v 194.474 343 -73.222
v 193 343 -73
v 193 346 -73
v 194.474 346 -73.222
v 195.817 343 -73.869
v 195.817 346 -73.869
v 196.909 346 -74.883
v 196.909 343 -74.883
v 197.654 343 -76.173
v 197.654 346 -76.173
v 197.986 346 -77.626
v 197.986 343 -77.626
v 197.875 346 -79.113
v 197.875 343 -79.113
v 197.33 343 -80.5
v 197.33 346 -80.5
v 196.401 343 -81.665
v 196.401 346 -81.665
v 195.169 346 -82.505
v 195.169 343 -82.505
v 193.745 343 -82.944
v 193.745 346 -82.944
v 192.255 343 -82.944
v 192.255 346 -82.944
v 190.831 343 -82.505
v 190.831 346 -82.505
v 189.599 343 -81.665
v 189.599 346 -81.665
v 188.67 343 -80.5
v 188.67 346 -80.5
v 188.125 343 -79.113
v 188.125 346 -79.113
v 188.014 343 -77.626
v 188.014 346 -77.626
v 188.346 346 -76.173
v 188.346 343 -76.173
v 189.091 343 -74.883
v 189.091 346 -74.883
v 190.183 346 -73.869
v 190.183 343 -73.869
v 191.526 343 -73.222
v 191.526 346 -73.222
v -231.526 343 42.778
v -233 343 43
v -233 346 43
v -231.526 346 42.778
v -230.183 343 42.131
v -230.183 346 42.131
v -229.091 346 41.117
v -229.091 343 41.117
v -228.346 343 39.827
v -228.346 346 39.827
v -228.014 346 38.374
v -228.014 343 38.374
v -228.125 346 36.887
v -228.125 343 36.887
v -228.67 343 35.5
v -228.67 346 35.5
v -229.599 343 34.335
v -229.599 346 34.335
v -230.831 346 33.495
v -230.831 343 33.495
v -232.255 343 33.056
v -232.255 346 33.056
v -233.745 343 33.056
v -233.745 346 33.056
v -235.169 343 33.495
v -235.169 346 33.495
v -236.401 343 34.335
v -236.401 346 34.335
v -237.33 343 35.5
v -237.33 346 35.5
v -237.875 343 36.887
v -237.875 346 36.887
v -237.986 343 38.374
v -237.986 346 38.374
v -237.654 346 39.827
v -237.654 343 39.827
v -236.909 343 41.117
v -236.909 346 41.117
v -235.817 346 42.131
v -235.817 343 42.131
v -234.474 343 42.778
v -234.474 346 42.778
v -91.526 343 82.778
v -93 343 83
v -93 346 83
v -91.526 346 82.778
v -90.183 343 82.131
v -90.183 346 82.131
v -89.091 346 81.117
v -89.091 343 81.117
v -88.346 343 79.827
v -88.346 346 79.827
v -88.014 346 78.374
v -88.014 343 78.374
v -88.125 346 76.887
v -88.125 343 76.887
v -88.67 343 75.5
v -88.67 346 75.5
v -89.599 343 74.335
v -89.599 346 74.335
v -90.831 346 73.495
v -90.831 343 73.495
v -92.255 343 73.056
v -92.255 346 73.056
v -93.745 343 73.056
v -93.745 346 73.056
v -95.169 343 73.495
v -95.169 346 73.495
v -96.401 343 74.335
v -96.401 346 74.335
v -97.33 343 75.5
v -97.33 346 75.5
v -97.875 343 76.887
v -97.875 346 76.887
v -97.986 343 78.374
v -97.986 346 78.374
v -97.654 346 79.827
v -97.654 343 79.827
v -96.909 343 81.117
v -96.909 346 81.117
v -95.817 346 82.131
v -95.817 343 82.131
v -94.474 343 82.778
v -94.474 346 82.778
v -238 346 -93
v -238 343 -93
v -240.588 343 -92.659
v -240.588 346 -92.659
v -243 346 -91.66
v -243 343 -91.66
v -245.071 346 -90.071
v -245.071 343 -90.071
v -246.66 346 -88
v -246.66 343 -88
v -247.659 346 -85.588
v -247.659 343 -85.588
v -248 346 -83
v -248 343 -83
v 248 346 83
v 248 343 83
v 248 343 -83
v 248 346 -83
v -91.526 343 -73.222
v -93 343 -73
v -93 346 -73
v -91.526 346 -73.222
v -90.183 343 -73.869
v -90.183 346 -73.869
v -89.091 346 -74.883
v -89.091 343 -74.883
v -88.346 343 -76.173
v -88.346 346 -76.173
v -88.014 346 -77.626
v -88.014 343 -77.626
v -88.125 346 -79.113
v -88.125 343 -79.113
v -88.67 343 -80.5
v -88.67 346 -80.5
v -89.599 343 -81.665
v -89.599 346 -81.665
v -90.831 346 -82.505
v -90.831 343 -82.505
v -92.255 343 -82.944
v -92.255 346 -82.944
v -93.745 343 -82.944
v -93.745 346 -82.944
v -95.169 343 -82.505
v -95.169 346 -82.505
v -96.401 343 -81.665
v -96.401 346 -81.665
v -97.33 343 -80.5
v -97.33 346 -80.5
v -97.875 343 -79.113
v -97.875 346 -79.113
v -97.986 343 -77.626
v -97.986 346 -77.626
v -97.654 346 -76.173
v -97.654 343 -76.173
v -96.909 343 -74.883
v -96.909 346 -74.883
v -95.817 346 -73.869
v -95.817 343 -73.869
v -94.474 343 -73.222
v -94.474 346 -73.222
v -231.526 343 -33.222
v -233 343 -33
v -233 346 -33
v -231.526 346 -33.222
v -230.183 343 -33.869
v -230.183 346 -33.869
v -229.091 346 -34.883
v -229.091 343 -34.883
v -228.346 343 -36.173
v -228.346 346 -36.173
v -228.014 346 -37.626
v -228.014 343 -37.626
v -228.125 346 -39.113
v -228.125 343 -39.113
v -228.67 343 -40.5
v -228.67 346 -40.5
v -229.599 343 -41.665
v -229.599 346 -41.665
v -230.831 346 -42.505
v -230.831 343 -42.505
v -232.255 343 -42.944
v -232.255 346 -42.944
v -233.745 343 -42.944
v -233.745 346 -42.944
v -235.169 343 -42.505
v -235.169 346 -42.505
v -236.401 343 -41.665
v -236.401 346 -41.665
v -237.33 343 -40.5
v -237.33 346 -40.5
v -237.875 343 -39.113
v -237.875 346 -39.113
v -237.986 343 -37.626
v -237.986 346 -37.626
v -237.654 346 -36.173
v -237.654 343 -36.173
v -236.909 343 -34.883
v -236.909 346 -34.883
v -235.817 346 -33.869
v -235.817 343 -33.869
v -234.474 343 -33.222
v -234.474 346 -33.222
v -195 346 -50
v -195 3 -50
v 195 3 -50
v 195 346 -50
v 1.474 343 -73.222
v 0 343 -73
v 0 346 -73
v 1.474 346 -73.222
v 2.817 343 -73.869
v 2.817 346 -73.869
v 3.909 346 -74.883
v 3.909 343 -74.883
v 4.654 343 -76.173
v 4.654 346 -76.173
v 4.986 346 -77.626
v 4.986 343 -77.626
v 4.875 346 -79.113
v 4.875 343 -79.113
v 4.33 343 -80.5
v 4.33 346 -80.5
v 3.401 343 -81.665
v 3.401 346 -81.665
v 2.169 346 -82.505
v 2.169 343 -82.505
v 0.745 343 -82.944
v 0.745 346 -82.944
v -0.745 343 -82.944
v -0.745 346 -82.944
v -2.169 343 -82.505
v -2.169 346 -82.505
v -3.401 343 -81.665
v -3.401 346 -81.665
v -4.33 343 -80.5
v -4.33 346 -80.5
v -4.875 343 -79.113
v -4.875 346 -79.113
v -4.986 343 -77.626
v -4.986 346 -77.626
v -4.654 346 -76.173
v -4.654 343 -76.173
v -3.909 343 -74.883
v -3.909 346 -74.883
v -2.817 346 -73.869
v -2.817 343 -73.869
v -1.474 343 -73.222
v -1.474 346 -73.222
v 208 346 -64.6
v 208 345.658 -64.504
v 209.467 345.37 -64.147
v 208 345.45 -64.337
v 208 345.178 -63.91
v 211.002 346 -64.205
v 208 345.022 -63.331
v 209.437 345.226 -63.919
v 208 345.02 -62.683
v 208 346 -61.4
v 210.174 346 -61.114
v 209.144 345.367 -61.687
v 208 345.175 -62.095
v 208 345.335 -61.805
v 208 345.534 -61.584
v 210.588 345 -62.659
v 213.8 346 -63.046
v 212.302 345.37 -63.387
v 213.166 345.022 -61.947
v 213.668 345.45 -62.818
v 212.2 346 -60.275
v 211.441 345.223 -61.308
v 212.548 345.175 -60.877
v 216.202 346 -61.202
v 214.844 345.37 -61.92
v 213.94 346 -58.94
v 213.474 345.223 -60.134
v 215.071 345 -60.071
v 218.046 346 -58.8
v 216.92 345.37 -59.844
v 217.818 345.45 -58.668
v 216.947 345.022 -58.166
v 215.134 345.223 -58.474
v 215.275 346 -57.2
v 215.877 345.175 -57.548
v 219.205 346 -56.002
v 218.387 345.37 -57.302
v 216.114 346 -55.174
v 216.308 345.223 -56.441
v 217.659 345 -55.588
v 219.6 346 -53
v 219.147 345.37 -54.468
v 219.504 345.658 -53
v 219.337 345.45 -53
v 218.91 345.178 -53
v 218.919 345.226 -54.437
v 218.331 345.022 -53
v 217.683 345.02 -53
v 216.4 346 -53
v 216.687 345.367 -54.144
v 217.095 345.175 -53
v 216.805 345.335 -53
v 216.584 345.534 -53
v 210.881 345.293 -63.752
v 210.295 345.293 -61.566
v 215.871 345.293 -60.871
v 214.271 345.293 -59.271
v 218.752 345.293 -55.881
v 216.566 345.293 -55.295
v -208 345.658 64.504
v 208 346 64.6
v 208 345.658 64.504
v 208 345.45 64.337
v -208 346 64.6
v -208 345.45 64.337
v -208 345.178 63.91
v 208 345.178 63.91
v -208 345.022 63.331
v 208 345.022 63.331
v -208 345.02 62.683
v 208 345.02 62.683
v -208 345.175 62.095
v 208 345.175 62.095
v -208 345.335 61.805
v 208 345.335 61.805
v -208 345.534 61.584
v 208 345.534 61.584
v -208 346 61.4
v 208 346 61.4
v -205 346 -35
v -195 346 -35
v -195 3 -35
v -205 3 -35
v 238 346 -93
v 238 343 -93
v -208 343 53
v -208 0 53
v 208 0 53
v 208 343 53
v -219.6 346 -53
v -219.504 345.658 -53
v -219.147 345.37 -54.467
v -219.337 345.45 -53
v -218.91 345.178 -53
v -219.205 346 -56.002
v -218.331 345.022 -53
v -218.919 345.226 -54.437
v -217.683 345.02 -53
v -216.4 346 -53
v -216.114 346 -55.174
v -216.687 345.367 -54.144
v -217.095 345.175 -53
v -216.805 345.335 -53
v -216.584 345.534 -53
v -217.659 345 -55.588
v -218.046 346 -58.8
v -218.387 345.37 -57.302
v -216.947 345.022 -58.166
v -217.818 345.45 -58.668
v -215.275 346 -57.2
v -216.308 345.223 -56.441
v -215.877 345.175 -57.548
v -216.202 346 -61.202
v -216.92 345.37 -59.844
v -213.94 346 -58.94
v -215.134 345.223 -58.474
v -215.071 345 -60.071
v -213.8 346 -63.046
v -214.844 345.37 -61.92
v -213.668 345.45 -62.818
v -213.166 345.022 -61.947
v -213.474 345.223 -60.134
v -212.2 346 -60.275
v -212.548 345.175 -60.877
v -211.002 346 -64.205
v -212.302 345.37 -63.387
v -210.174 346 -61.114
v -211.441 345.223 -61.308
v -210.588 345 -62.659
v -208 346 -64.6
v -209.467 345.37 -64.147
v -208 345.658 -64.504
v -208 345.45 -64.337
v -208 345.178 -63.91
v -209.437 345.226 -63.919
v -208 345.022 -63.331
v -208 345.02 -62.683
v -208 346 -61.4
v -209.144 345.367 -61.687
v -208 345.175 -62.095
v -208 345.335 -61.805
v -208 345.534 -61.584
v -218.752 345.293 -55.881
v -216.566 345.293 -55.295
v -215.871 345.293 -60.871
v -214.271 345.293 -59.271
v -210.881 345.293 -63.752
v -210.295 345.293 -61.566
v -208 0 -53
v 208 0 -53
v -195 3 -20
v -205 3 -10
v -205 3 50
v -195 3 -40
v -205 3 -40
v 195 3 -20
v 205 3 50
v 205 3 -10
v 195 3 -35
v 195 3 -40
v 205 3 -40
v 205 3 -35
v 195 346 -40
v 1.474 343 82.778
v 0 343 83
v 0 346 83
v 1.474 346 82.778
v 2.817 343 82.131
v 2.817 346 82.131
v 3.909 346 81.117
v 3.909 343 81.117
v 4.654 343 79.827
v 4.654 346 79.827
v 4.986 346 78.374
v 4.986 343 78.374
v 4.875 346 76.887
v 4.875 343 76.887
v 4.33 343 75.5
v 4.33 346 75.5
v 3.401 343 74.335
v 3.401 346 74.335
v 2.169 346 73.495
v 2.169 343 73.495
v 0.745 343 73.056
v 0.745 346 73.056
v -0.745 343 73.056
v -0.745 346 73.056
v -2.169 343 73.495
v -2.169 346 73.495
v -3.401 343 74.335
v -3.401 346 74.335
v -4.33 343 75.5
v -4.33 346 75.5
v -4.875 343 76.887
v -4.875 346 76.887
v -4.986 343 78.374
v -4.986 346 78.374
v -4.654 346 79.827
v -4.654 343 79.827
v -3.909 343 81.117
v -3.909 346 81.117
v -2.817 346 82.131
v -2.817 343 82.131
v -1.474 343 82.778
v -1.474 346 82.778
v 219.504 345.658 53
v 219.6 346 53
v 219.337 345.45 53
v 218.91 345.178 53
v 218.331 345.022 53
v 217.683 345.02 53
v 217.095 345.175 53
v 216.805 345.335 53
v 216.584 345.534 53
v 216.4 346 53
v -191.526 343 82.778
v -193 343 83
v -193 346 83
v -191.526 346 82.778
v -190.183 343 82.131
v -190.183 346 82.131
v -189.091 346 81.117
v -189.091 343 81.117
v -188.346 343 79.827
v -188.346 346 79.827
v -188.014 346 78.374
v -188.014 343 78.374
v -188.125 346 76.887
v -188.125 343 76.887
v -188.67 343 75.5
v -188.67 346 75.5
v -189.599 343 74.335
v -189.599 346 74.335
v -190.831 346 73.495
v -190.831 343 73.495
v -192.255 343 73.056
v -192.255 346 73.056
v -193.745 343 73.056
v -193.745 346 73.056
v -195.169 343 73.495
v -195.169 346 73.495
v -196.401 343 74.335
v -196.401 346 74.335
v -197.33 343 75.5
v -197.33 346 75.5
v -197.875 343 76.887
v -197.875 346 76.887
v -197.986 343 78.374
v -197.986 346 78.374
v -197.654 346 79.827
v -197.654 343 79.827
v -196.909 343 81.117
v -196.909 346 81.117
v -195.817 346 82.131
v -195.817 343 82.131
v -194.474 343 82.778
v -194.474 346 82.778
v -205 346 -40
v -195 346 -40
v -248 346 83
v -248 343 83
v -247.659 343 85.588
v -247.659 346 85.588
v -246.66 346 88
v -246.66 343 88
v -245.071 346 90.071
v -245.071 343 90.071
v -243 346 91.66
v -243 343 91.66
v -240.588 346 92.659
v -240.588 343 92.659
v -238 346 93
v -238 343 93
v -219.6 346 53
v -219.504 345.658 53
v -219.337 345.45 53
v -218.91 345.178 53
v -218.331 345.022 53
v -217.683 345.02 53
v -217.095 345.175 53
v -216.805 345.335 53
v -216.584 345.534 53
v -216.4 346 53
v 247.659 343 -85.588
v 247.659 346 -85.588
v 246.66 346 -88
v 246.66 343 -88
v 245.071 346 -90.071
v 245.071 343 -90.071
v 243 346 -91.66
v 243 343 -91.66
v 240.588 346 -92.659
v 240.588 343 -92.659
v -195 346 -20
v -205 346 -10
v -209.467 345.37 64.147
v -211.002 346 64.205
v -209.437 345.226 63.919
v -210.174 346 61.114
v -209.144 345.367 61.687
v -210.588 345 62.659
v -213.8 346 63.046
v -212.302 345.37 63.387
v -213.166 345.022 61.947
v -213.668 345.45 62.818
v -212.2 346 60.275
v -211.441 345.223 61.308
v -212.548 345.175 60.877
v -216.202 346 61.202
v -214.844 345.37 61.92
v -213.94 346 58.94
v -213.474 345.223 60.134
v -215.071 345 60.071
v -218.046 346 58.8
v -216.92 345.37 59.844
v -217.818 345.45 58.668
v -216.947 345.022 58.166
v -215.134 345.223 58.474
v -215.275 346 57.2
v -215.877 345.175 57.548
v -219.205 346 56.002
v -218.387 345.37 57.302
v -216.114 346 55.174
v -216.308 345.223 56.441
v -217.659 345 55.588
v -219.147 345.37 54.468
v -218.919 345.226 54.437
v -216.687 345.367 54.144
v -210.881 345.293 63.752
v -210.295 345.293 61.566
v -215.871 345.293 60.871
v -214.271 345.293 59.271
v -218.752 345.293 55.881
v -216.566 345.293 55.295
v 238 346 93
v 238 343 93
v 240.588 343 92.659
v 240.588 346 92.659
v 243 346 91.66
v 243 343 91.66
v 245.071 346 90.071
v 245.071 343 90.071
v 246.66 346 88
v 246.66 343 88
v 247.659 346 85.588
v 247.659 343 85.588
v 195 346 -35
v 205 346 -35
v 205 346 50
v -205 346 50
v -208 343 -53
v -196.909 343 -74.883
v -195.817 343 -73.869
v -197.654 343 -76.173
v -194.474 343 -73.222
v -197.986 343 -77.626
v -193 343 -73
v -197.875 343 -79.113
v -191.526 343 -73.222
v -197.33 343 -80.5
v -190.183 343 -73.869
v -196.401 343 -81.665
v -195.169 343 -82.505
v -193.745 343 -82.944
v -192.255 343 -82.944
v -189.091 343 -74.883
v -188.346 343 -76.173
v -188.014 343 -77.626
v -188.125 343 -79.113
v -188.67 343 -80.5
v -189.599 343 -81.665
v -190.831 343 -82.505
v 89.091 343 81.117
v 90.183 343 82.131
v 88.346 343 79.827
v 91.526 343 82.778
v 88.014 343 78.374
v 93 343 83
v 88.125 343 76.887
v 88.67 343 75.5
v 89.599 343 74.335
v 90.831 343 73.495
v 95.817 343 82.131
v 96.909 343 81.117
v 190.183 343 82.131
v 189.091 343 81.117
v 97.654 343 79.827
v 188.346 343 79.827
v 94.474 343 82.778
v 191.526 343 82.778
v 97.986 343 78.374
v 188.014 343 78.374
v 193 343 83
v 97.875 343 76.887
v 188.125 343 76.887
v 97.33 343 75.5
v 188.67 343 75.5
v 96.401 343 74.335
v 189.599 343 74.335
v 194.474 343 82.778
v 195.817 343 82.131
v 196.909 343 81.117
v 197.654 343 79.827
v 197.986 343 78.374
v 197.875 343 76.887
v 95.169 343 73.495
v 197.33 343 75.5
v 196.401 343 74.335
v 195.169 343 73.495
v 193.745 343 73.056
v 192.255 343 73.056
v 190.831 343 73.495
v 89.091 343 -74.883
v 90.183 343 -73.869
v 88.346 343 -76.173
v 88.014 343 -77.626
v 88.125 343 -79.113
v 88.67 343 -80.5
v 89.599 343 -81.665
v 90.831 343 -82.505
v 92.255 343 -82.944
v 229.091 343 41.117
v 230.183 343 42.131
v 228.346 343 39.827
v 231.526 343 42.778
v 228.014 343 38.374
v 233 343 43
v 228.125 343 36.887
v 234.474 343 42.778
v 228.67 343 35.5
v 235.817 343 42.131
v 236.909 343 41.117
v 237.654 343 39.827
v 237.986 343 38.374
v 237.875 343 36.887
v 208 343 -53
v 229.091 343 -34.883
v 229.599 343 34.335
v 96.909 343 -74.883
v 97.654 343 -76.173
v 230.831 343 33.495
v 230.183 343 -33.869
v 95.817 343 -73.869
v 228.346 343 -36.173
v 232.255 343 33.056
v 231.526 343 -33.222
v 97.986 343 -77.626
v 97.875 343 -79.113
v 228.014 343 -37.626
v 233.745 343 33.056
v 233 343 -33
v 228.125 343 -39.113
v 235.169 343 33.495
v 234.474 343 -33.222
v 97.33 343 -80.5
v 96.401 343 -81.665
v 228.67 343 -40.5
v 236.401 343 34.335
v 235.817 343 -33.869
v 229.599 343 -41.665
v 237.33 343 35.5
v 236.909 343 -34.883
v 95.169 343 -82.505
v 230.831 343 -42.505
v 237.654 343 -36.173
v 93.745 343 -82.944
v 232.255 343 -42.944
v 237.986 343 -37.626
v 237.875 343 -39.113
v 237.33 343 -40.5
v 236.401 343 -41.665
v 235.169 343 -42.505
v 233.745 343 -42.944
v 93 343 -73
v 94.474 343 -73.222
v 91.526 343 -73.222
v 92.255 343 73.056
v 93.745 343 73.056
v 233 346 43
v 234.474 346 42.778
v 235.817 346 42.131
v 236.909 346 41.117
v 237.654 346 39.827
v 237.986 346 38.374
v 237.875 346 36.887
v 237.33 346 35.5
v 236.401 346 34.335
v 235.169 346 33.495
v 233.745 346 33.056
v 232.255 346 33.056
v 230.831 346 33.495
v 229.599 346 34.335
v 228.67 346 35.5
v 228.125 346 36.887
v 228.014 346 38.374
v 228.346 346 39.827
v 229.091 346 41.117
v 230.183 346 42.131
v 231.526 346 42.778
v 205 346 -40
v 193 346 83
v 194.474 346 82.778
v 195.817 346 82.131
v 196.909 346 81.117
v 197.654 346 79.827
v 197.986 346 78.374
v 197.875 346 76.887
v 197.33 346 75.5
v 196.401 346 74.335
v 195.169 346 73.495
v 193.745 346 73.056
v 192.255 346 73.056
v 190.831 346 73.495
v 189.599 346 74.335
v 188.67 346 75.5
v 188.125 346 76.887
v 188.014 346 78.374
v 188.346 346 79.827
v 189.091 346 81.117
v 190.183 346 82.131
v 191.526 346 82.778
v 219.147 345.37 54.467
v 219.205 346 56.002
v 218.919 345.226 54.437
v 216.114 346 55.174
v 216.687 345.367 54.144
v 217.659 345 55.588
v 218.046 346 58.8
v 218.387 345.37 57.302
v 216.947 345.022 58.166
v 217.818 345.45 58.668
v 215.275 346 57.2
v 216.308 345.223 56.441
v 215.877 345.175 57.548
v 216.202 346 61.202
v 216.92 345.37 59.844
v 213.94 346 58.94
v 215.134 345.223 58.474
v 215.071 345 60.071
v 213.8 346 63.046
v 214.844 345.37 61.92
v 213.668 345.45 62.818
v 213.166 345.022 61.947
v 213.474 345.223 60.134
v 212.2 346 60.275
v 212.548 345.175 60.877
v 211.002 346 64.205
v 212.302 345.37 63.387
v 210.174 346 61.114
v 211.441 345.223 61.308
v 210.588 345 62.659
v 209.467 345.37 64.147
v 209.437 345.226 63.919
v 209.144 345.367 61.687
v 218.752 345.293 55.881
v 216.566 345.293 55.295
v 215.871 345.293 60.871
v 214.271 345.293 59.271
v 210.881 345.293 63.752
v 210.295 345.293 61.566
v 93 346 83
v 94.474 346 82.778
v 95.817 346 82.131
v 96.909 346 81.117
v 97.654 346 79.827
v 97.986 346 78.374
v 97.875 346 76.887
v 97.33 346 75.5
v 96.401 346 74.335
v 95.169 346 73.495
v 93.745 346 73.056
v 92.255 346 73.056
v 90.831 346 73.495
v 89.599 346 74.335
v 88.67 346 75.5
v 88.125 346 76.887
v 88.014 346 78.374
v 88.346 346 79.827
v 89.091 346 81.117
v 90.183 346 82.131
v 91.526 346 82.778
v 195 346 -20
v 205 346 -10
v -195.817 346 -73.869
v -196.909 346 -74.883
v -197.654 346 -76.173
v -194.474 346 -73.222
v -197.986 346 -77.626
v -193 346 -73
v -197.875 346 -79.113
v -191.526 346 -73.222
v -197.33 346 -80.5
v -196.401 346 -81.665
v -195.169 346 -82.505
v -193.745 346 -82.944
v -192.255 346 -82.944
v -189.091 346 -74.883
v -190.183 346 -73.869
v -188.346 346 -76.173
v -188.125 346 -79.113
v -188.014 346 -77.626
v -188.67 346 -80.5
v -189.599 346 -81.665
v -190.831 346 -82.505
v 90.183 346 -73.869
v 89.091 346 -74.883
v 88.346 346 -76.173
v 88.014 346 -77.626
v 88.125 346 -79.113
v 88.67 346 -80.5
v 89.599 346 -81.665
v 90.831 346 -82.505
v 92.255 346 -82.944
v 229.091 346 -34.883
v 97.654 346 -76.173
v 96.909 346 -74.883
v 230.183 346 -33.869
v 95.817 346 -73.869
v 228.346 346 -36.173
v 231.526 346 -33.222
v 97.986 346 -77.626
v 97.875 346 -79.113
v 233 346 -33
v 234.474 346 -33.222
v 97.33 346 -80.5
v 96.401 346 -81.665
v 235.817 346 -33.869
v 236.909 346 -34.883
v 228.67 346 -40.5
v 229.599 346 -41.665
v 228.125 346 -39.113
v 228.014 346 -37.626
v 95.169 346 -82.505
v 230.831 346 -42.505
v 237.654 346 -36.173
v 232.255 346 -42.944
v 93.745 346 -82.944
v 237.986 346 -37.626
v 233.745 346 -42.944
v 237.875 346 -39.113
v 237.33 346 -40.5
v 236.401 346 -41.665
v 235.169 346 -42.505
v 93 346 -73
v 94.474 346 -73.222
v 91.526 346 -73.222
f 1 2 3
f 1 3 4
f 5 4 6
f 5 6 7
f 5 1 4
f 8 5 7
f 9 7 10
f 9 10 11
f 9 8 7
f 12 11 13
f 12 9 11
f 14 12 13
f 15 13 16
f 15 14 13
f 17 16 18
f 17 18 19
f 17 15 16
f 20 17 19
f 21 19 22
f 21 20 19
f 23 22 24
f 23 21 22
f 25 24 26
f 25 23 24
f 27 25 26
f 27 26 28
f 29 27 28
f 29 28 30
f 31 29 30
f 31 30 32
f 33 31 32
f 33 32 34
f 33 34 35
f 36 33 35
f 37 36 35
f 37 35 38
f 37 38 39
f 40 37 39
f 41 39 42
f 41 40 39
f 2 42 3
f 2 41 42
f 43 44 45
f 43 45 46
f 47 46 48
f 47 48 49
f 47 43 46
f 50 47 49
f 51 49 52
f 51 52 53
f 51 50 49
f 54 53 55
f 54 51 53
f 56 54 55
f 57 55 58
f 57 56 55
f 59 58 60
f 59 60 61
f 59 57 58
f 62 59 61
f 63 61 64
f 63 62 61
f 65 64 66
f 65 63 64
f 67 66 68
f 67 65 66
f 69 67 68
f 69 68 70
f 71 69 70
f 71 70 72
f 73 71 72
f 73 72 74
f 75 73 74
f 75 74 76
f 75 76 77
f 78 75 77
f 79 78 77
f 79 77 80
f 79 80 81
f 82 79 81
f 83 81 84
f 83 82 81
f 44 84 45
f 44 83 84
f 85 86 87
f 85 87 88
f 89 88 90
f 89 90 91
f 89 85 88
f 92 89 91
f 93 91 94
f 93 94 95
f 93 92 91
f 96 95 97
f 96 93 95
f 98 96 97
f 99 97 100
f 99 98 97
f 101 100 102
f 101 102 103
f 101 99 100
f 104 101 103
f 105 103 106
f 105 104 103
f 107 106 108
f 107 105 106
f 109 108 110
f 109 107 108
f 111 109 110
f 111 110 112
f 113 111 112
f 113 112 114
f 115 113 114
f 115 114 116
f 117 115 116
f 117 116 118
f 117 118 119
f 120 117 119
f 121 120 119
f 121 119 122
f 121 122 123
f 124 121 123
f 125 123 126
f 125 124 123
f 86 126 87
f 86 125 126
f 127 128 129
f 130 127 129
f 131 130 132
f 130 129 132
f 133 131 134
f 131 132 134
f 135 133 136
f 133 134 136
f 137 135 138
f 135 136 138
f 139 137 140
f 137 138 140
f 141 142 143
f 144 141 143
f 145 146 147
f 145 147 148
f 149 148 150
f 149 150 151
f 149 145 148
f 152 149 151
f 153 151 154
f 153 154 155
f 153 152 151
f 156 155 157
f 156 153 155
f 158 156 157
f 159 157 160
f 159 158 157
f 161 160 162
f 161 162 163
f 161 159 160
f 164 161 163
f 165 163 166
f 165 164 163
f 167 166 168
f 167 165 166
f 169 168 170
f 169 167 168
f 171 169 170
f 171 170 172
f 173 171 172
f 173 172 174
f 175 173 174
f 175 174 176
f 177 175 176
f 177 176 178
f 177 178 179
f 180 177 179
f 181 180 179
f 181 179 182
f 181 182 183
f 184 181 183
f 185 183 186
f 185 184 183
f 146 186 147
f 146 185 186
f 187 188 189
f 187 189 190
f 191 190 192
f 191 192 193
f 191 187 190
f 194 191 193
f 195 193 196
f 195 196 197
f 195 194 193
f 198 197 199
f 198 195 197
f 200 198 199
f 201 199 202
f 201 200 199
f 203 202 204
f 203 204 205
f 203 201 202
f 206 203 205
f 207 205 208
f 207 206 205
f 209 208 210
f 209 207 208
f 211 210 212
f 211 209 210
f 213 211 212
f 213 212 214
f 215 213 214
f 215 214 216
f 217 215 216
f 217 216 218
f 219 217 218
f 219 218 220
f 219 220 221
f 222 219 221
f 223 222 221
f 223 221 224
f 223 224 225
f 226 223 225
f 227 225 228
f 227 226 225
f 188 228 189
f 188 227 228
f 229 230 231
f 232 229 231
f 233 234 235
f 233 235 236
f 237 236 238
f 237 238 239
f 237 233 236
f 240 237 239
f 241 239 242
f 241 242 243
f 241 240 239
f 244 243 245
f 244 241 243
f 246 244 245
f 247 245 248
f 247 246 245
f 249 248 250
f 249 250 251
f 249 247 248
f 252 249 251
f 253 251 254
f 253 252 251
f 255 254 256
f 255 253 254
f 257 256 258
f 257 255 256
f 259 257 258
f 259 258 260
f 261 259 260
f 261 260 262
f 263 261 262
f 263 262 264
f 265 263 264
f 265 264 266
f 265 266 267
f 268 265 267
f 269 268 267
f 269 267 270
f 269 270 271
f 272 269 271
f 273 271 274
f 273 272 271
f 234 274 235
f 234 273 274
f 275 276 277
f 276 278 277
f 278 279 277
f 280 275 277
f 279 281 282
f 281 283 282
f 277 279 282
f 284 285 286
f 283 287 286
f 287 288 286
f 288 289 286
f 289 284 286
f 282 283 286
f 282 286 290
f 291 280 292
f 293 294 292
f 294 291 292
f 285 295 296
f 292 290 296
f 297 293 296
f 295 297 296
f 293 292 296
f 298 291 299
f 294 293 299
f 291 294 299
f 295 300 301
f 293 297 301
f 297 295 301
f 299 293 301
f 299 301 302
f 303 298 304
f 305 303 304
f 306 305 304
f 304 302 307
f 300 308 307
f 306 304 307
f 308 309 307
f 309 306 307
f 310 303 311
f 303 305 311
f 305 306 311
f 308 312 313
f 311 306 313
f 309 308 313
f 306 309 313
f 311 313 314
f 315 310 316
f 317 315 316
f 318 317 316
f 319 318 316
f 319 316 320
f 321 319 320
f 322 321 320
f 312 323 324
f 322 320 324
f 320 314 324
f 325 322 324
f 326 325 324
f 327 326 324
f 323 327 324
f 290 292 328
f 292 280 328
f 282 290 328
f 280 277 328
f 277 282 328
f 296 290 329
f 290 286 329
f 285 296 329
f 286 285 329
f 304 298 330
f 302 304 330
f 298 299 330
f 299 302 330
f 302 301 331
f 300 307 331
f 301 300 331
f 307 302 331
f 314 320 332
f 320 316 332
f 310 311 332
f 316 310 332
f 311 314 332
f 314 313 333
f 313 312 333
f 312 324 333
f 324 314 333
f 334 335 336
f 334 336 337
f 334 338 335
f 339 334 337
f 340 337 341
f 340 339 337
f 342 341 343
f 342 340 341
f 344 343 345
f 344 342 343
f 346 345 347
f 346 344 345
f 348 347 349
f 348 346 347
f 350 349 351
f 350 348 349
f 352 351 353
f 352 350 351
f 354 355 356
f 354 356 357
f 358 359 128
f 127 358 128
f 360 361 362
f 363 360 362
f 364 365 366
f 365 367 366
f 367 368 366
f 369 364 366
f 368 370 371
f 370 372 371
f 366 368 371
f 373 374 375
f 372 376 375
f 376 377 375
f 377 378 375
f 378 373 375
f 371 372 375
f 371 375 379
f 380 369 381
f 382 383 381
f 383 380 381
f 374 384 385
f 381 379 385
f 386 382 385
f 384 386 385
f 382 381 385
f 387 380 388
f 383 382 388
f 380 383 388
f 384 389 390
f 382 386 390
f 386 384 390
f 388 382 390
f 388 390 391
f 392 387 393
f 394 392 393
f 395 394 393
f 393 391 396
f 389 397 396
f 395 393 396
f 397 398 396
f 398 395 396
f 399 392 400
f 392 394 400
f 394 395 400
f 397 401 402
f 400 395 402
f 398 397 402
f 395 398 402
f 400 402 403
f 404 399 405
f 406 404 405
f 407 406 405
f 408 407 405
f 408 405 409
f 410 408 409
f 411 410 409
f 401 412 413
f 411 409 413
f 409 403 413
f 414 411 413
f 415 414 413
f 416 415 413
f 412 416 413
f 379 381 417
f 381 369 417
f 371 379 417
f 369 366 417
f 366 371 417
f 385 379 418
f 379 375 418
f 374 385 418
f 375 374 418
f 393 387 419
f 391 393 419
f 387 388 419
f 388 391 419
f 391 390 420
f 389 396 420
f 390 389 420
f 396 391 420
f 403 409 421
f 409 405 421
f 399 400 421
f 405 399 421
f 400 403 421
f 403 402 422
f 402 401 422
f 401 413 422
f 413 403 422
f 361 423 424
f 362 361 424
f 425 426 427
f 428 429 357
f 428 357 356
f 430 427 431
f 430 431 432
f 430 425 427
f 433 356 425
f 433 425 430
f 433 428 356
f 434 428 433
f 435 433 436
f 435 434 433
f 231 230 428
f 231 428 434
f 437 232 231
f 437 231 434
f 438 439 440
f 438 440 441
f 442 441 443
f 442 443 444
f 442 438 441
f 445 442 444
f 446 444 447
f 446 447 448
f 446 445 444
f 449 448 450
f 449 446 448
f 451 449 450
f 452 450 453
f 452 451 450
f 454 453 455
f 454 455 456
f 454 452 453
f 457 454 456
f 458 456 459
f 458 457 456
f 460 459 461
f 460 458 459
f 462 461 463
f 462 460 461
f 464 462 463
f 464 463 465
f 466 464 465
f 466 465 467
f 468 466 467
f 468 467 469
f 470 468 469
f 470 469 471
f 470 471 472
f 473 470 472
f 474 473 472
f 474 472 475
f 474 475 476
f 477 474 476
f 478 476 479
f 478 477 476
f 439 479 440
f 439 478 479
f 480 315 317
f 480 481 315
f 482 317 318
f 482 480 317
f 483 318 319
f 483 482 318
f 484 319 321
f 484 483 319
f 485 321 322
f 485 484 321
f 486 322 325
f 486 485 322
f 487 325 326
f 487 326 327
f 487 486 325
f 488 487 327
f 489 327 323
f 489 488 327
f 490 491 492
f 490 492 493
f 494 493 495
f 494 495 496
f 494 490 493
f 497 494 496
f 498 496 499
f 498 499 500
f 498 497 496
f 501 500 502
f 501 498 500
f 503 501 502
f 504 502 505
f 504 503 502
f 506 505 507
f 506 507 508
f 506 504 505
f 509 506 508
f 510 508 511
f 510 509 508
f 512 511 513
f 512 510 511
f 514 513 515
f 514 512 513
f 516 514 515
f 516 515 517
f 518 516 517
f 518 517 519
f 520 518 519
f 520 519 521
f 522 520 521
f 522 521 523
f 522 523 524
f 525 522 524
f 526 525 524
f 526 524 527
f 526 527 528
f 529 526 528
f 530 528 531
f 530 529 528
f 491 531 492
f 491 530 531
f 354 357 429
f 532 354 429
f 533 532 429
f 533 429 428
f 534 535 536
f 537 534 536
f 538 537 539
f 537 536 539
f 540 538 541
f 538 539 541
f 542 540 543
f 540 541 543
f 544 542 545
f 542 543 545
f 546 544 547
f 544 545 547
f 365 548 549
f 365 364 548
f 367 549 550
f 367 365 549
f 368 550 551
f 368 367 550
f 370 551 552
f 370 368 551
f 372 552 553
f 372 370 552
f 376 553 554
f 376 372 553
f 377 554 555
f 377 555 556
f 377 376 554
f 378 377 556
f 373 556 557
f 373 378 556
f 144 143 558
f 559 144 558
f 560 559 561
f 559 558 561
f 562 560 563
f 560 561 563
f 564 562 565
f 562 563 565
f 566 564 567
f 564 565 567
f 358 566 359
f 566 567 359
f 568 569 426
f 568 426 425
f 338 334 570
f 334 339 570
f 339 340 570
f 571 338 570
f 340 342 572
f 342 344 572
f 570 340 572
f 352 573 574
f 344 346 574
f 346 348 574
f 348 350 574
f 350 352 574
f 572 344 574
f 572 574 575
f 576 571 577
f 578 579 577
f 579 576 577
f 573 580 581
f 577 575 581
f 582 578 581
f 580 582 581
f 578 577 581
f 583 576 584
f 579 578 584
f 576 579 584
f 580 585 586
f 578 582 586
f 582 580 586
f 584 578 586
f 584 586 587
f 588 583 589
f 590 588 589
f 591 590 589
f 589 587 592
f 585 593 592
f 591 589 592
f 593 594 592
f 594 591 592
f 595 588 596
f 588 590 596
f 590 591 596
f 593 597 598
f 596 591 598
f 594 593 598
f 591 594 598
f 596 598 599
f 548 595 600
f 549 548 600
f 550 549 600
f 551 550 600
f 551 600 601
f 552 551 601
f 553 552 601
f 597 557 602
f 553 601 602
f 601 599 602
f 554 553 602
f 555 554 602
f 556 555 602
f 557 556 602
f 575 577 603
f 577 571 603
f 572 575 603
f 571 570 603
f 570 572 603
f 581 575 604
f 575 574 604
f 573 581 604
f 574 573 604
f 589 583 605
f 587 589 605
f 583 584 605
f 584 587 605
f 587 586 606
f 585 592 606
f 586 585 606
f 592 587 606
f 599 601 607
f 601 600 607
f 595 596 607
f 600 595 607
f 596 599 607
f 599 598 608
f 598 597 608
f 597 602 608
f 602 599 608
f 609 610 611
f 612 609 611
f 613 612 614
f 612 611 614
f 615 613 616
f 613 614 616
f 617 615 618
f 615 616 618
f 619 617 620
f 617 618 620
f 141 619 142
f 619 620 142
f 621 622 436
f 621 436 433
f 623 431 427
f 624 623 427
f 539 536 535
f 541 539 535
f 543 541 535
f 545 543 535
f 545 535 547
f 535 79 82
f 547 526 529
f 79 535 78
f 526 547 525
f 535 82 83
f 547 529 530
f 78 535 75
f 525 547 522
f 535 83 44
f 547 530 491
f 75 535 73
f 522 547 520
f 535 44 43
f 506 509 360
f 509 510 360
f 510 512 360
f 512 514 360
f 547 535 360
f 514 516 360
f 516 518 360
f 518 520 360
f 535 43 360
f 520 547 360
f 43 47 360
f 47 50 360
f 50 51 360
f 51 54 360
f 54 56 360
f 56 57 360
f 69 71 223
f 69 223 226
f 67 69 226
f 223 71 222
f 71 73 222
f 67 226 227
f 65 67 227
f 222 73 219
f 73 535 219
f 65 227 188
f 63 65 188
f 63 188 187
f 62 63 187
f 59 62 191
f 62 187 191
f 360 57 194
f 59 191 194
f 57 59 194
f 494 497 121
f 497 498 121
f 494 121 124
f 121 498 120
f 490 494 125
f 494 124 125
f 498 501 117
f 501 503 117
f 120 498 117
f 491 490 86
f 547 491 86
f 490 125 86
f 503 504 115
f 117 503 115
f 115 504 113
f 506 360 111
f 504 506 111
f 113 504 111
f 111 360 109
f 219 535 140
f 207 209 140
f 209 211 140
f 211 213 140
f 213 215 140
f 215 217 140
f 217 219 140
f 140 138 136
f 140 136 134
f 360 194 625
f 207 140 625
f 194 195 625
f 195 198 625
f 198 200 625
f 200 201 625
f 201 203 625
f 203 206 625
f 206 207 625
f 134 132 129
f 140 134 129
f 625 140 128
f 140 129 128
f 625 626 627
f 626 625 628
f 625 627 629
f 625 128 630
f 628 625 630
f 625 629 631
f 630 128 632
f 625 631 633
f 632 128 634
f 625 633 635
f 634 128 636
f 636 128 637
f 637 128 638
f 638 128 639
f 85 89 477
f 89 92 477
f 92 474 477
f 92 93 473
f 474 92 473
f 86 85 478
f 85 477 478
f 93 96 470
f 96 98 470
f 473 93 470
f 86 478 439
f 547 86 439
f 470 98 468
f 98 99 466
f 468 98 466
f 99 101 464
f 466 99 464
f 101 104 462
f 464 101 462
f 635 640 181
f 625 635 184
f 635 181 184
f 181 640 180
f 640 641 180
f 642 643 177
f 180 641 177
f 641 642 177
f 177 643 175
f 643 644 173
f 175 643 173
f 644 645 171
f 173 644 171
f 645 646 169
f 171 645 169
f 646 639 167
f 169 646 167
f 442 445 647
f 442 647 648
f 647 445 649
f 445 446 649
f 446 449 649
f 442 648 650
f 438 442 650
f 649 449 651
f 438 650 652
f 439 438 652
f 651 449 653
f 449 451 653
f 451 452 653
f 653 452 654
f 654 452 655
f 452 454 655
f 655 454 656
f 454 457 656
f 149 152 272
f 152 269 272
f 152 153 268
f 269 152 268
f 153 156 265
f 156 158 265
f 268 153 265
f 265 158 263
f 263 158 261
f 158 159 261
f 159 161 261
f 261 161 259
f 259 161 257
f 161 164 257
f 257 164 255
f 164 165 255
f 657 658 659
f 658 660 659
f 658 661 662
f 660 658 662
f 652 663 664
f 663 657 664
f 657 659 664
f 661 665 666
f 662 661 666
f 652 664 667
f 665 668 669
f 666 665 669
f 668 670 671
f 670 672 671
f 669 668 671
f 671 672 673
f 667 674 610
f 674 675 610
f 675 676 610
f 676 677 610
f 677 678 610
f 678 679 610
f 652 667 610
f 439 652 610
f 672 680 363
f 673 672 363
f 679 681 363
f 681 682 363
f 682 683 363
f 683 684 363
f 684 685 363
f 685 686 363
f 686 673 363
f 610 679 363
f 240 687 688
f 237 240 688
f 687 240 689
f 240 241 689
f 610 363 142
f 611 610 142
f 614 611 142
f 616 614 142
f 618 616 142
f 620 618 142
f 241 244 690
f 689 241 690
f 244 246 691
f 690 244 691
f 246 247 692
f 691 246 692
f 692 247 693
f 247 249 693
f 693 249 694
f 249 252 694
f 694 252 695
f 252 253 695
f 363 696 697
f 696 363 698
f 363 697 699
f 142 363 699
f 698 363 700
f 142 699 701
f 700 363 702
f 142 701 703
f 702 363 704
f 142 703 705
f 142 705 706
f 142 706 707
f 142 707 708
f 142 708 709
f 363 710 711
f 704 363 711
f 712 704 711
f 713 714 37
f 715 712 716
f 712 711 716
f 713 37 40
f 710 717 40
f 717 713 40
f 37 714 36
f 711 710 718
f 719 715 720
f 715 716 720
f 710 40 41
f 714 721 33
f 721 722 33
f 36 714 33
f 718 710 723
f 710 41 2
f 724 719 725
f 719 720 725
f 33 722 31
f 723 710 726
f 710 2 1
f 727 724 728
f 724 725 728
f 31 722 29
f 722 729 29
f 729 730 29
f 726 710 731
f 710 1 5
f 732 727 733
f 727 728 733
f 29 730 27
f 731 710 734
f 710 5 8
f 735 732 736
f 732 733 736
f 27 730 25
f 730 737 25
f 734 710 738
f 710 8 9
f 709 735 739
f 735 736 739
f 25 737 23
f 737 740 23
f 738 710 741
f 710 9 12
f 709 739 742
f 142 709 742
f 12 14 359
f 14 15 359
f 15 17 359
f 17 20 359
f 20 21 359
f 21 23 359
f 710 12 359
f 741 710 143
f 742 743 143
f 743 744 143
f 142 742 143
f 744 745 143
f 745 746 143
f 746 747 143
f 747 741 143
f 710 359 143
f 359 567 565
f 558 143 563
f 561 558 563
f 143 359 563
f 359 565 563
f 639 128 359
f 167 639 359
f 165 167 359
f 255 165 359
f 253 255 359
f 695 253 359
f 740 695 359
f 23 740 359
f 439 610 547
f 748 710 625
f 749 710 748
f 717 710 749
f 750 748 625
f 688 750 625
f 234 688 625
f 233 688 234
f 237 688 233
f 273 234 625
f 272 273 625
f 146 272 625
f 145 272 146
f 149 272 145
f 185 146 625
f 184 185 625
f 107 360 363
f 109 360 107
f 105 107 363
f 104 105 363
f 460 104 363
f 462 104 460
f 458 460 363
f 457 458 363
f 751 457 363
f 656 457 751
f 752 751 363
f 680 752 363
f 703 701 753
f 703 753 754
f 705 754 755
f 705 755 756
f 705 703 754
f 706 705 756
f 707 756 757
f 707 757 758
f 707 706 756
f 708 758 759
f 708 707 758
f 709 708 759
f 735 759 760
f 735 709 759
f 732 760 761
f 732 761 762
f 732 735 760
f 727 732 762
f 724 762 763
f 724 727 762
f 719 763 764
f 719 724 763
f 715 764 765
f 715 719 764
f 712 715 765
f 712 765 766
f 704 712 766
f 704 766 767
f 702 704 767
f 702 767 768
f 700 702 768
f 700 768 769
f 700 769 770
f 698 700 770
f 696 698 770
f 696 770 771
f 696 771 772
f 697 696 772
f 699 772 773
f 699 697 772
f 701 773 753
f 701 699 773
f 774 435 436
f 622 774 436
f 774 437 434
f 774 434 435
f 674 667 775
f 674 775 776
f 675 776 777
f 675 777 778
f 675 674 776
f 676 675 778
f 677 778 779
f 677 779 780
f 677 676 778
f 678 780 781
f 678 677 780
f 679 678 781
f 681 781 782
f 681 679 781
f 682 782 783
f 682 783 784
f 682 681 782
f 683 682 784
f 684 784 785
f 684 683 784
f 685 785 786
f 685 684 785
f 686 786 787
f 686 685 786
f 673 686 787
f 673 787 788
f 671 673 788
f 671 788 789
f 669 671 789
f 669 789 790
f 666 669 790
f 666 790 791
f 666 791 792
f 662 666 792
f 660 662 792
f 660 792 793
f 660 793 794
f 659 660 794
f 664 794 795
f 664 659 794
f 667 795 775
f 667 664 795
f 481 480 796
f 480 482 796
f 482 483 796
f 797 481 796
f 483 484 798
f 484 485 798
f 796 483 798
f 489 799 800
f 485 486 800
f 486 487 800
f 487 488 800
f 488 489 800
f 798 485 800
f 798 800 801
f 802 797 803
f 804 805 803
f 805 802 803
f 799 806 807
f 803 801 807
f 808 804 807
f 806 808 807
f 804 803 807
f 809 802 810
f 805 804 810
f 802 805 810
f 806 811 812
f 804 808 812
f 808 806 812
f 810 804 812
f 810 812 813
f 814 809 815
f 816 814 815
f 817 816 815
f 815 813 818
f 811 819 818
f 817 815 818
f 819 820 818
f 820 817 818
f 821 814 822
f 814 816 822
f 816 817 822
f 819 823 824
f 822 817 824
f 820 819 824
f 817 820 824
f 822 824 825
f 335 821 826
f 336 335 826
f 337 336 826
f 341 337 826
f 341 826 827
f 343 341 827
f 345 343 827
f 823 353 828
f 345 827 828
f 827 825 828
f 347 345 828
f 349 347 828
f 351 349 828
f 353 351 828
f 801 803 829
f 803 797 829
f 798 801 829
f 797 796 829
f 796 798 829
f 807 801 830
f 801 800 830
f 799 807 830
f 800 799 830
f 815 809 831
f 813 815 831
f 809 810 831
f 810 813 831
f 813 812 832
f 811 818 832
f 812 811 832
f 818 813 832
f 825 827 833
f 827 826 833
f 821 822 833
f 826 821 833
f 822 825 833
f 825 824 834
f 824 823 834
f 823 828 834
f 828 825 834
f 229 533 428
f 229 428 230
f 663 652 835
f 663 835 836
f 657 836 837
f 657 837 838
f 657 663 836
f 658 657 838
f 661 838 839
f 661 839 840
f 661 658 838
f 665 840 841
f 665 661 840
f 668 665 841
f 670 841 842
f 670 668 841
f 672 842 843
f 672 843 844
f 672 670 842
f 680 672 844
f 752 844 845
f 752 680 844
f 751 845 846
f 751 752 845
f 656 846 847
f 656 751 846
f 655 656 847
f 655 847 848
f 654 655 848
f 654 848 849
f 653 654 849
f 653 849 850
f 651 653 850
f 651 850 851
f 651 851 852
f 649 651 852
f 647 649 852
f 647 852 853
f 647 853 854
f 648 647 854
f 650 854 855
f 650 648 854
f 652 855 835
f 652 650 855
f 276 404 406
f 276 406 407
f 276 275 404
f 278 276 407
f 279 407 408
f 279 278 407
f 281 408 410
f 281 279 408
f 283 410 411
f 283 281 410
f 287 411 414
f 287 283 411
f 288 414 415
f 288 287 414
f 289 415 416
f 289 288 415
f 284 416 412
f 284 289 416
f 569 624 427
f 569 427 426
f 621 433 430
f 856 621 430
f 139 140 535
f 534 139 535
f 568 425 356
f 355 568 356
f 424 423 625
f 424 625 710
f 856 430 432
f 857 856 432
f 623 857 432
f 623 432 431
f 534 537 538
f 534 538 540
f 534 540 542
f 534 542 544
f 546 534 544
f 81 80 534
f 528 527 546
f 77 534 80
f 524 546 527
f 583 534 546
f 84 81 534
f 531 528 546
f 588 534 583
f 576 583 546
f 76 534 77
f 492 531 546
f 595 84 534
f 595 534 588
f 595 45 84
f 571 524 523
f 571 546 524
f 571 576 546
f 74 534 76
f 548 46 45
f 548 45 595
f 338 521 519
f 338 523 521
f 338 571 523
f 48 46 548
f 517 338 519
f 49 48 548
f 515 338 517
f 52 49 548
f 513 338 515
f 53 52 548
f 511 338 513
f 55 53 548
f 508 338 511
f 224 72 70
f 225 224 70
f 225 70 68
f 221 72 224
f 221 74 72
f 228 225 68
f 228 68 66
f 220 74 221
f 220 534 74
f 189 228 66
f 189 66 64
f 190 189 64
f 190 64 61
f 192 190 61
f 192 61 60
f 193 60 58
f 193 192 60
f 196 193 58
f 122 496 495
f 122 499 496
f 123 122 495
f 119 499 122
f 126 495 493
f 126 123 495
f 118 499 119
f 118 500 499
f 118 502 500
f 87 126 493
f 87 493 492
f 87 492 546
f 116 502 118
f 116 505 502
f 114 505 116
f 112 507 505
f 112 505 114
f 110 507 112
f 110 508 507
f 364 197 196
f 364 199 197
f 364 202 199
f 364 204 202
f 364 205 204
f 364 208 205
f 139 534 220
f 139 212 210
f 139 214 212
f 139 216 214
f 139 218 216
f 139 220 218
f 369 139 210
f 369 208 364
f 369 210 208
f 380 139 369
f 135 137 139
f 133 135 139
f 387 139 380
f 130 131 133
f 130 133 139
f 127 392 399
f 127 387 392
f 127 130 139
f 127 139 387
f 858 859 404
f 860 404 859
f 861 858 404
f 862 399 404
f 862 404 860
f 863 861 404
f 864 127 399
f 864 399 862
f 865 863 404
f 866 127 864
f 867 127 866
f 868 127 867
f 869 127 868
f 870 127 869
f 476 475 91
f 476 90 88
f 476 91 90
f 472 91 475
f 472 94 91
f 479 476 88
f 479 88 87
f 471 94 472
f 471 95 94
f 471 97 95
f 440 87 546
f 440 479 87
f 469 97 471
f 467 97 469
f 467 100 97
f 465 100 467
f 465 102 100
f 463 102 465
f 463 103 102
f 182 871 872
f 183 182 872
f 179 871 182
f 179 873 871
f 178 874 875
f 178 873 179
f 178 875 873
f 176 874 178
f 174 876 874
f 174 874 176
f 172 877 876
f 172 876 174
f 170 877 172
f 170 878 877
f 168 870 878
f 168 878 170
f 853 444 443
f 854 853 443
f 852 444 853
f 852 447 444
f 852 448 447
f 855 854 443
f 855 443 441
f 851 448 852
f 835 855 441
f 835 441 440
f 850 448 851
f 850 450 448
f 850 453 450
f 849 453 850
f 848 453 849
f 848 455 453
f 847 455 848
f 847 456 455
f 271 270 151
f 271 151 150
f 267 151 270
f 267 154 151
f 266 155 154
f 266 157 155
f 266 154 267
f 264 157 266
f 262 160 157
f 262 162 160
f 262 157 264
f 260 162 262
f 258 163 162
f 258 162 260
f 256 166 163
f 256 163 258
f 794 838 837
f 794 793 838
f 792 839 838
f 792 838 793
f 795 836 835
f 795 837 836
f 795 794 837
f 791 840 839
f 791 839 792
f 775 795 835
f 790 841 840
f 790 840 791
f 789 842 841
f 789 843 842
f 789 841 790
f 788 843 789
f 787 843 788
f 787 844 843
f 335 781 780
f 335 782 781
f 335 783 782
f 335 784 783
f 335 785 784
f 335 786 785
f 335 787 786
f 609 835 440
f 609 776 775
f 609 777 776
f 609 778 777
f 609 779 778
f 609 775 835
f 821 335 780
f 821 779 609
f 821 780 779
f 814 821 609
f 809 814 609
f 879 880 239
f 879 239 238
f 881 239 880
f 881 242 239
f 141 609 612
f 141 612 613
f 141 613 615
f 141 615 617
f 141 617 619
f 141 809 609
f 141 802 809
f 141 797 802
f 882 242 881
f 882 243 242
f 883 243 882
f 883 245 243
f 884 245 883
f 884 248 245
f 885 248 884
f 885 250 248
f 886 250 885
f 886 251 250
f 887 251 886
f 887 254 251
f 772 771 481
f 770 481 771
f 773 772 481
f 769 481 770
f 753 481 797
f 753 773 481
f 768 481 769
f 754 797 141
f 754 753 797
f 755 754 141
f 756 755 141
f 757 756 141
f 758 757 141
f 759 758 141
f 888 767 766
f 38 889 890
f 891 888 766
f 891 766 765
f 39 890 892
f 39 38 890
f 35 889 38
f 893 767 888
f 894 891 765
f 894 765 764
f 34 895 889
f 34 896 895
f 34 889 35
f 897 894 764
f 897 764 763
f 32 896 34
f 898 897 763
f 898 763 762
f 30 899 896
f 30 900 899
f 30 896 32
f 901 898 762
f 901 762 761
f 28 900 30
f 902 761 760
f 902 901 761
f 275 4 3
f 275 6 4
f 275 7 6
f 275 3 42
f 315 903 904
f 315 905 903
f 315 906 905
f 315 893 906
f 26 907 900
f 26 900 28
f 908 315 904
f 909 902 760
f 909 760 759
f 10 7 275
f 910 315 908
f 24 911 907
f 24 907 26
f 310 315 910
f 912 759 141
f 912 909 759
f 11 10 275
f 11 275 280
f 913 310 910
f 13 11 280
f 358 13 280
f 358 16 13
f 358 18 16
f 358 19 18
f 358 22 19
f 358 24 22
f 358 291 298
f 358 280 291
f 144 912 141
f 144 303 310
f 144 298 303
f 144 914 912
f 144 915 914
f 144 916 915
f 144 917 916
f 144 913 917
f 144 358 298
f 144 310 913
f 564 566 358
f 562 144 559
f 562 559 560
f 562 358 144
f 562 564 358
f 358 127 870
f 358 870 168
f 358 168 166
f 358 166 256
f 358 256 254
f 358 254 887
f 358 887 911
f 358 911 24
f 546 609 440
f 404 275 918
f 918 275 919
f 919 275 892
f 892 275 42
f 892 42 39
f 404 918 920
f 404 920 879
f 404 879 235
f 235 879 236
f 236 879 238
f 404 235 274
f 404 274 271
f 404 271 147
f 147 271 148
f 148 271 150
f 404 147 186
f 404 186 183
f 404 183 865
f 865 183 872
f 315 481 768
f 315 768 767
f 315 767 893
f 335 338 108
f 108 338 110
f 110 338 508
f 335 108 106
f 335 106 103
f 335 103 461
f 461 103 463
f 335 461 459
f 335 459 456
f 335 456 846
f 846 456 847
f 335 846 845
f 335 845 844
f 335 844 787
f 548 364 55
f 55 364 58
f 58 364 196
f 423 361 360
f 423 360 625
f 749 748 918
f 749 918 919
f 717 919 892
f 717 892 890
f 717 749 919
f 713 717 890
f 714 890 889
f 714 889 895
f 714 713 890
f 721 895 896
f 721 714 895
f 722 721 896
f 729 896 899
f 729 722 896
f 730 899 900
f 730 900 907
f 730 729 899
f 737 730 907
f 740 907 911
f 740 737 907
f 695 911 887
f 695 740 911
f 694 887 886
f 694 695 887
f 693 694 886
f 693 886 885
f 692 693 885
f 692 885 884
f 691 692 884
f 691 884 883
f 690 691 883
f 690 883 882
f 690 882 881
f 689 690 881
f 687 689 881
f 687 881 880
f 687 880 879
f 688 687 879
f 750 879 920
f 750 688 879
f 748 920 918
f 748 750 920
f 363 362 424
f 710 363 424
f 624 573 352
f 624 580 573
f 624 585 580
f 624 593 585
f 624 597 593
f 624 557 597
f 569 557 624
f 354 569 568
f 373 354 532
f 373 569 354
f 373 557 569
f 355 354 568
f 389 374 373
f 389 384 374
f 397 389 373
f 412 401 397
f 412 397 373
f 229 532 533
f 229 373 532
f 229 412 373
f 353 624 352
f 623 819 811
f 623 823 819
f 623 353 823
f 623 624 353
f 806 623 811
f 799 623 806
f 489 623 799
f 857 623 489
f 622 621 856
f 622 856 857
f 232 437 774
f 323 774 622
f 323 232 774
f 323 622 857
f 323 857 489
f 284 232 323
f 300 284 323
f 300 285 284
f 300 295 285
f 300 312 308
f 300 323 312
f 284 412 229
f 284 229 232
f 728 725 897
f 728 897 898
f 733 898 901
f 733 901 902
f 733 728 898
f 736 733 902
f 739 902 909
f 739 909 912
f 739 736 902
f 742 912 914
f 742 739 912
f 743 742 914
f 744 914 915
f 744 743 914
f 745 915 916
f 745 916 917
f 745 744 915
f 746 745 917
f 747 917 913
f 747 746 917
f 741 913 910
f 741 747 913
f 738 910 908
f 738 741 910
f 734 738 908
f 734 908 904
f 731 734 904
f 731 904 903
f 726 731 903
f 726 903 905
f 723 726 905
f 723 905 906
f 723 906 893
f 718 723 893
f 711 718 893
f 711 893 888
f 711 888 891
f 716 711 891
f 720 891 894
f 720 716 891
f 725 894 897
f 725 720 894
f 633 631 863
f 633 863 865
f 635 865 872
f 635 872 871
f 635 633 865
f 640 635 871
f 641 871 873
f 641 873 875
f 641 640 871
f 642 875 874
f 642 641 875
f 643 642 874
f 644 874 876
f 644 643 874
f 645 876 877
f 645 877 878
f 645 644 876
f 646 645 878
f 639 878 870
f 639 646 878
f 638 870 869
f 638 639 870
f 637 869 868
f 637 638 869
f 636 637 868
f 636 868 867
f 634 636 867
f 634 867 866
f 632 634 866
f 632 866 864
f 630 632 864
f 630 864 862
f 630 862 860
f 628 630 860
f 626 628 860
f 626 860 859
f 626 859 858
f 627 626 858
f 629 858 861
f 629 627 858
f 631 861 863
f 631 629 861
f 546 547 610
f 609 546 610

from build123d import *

# Parameters (mm, degrees)
BOSS_EXTRUDE1_DEPTH = 3
SKETCH1_3_W         = 416
SKETCH1_3_H         = 106
BOSS_EXTRUDE2_DEPTH = 343
SKETCH2_R           = 5
BOSS_EXTRUDE3_DEPTH = 3
SKETCH3_RX          = 1.6
SKETCH3_RY          = 1


with BuildPart() as part:
    # Sketch1 → Boss-Extrude1 (new body)
    with BuildSketch(Plane(origin=(0, 0, 0), x_dir=(1, 0, 0), z_dir=(0, 1, 0))):
        Polygon((-195, 40), (-205, 40), (-205, 35), (-195, 35), (-195, 20), (-205, 10), (-205, -50), (205, -50), (205, 10), (195, 20), (195, 35), (205, 35), (205, 40), (195, 40), (195, 50), (-195, 50), align=None)
    extrude(amount=BOSS_EXTRUDE1_DEPTH)

    # Sketch1<3> → Boss-Extrude2 (add)
    with BuildSketch(Plane(origin=(0, 0, 0), x_dir=(1, 0, 0), z_dir=(0, 1, 0))):
        Rectangle(SKETCH1_3_W, SKETCH1_3_H)
        Polygon((-195, 40), (-195, 50), (195, 50), (195, 40), (205, 40), (205, 35), (195, 35), (195, 20), (205, 10), (205, -50), (-205, -50), (-205, 10), (-195, 20), (-195, 35), (-205, 35), (-205, 40), align=None, mode=Mode.SUBTRACT)
    extrude(amount=BOSS_EXTRUDE2_DEPTH)

    # Sketch2 → Boss-Extrude3 (add)
    with BuildSketch(Plane(origin=(0, 343, 0), x_dir=(1, 0, 0), z_dir=(0, 1, 0))):
        with BuildLine():
            ThreePointArc((238, -93), (245.071067812, -90.071067812), (248, -83))
            Line((248, -83), (248, 83))
            ThreePointArc((248, 83), (245.071067812, 90.071067812), (238, 93))
            Line((238, 93), (-238, 93))
            ThreePointArc((-238, 93), (-245.071067812, 90.071067812), (-248, 83))
            Line((-248, 83), (-248, -83))
            ThreePointArc((-248, -83), (-245.071067812, -90.071067812), (-238, -93))
            Line((-238, -93), (238, -93))
        make_face()
        with Locations((-193, -78)):
            Circle(SKETCH2_R, mode=Mode.SUBTRACT)
        with Locations((-93, -78)):
            Circle(SKETCH2_R, mode=Mode.SUBTRACT)
        with Locations((-233, -38)):
            Circle(SKETCH2_R, mode=Mode.SUBTRACT)
        with Locations((0, -78)):
            Circle(SKETCH2_R, mode=Mode.SUBTRACT)
        with Locations((93, -78)):
            Circle(SKETCH2_R, mode=Mode.SUBTRACT)
        with Locations((193, -78)):
            Circle(SKETCH2_R, mode=Mode.SUBTRACT)
        with Locations((233, -38)):
            Circle(SKETCH2_R, mode=Mode.SUBTRACT)
        with Locations((-233, 38)):
            Circle(SKETCH2_R, mode=Mode.SUBTRACT)
        with Locations((-193, 78)):
            Circle(SKETCH2_R, mode=Mode.SUBTRACT)
        with Locations((-93, 78)):
            Circle(SKETCH2_R, mode=Mode.SUBTRACT)
        with Locations((233, 38)):
            Circle(SKETCH2_R, mode=Mode.SUBTRACT)
        with Locations((0, 78)):
            Circle(SKETCH2_R, mode=Mode.SUBTRACT)
        with Locations((93, 78)):
            Circle(SKETCH2_R, mode=Mode.SUBTRACT)
        with Locations((193, 78)):
            Circle(SKETCH2_R, mode=Mode.SUBTRACT)
        Polygon((-205, 40), (-195, 40), (-195, 50), (195, 50), (195, 40), (205, 40), (205, 35), (195, 35), (195, 20), (205, 10), (205, -50), (-205, -50), (-205, 10), (-195, 20), (-195, 35), (-205, 35), align=None, mode=Mode.SUBTRACT)
    extrude(amount=BOSS_EXTRUDE3_DEPTH)

    # Cut-Sweep2: sweep along a path in Sketch4
    with BuildLine(Plane(origin=(0, 346, 0), x_dir=(1, 0, 0), z_dir=(0, 1, 0))) as cut_sweep2_path:
        Line((-208, 63), (208, 63))
        ThreePointArc((208, 63), (215.071067812, 60.071067812), (218, 53))
        Line((218, 53), (218, -53))
        ThreePointArc((218, -53), (215.071067812, -60.071067812), (208, -63))
        Line((208, -63), (-208, -63))
        ThreePointArc((-208, -63), (-215.071067812, -60.071067812), (-218, -53))
        Line((-218, -53), (-218, 53))
        ThreePointArc((-218, 53), (-215.071067812, 60.071067812), (-208, 63))
    # Sketch3 → Cut-Sweep2 (sweep, cut)
    with BuildSketch(Plane.XY):
        with Locations((-218, 346)):
            Ellipse(SKETCH3_RX, SKETCH3_RY)
    sweep(path=cut_sweep2_path.line, mode=Mode.SUBTRACT)


solid = part.part
